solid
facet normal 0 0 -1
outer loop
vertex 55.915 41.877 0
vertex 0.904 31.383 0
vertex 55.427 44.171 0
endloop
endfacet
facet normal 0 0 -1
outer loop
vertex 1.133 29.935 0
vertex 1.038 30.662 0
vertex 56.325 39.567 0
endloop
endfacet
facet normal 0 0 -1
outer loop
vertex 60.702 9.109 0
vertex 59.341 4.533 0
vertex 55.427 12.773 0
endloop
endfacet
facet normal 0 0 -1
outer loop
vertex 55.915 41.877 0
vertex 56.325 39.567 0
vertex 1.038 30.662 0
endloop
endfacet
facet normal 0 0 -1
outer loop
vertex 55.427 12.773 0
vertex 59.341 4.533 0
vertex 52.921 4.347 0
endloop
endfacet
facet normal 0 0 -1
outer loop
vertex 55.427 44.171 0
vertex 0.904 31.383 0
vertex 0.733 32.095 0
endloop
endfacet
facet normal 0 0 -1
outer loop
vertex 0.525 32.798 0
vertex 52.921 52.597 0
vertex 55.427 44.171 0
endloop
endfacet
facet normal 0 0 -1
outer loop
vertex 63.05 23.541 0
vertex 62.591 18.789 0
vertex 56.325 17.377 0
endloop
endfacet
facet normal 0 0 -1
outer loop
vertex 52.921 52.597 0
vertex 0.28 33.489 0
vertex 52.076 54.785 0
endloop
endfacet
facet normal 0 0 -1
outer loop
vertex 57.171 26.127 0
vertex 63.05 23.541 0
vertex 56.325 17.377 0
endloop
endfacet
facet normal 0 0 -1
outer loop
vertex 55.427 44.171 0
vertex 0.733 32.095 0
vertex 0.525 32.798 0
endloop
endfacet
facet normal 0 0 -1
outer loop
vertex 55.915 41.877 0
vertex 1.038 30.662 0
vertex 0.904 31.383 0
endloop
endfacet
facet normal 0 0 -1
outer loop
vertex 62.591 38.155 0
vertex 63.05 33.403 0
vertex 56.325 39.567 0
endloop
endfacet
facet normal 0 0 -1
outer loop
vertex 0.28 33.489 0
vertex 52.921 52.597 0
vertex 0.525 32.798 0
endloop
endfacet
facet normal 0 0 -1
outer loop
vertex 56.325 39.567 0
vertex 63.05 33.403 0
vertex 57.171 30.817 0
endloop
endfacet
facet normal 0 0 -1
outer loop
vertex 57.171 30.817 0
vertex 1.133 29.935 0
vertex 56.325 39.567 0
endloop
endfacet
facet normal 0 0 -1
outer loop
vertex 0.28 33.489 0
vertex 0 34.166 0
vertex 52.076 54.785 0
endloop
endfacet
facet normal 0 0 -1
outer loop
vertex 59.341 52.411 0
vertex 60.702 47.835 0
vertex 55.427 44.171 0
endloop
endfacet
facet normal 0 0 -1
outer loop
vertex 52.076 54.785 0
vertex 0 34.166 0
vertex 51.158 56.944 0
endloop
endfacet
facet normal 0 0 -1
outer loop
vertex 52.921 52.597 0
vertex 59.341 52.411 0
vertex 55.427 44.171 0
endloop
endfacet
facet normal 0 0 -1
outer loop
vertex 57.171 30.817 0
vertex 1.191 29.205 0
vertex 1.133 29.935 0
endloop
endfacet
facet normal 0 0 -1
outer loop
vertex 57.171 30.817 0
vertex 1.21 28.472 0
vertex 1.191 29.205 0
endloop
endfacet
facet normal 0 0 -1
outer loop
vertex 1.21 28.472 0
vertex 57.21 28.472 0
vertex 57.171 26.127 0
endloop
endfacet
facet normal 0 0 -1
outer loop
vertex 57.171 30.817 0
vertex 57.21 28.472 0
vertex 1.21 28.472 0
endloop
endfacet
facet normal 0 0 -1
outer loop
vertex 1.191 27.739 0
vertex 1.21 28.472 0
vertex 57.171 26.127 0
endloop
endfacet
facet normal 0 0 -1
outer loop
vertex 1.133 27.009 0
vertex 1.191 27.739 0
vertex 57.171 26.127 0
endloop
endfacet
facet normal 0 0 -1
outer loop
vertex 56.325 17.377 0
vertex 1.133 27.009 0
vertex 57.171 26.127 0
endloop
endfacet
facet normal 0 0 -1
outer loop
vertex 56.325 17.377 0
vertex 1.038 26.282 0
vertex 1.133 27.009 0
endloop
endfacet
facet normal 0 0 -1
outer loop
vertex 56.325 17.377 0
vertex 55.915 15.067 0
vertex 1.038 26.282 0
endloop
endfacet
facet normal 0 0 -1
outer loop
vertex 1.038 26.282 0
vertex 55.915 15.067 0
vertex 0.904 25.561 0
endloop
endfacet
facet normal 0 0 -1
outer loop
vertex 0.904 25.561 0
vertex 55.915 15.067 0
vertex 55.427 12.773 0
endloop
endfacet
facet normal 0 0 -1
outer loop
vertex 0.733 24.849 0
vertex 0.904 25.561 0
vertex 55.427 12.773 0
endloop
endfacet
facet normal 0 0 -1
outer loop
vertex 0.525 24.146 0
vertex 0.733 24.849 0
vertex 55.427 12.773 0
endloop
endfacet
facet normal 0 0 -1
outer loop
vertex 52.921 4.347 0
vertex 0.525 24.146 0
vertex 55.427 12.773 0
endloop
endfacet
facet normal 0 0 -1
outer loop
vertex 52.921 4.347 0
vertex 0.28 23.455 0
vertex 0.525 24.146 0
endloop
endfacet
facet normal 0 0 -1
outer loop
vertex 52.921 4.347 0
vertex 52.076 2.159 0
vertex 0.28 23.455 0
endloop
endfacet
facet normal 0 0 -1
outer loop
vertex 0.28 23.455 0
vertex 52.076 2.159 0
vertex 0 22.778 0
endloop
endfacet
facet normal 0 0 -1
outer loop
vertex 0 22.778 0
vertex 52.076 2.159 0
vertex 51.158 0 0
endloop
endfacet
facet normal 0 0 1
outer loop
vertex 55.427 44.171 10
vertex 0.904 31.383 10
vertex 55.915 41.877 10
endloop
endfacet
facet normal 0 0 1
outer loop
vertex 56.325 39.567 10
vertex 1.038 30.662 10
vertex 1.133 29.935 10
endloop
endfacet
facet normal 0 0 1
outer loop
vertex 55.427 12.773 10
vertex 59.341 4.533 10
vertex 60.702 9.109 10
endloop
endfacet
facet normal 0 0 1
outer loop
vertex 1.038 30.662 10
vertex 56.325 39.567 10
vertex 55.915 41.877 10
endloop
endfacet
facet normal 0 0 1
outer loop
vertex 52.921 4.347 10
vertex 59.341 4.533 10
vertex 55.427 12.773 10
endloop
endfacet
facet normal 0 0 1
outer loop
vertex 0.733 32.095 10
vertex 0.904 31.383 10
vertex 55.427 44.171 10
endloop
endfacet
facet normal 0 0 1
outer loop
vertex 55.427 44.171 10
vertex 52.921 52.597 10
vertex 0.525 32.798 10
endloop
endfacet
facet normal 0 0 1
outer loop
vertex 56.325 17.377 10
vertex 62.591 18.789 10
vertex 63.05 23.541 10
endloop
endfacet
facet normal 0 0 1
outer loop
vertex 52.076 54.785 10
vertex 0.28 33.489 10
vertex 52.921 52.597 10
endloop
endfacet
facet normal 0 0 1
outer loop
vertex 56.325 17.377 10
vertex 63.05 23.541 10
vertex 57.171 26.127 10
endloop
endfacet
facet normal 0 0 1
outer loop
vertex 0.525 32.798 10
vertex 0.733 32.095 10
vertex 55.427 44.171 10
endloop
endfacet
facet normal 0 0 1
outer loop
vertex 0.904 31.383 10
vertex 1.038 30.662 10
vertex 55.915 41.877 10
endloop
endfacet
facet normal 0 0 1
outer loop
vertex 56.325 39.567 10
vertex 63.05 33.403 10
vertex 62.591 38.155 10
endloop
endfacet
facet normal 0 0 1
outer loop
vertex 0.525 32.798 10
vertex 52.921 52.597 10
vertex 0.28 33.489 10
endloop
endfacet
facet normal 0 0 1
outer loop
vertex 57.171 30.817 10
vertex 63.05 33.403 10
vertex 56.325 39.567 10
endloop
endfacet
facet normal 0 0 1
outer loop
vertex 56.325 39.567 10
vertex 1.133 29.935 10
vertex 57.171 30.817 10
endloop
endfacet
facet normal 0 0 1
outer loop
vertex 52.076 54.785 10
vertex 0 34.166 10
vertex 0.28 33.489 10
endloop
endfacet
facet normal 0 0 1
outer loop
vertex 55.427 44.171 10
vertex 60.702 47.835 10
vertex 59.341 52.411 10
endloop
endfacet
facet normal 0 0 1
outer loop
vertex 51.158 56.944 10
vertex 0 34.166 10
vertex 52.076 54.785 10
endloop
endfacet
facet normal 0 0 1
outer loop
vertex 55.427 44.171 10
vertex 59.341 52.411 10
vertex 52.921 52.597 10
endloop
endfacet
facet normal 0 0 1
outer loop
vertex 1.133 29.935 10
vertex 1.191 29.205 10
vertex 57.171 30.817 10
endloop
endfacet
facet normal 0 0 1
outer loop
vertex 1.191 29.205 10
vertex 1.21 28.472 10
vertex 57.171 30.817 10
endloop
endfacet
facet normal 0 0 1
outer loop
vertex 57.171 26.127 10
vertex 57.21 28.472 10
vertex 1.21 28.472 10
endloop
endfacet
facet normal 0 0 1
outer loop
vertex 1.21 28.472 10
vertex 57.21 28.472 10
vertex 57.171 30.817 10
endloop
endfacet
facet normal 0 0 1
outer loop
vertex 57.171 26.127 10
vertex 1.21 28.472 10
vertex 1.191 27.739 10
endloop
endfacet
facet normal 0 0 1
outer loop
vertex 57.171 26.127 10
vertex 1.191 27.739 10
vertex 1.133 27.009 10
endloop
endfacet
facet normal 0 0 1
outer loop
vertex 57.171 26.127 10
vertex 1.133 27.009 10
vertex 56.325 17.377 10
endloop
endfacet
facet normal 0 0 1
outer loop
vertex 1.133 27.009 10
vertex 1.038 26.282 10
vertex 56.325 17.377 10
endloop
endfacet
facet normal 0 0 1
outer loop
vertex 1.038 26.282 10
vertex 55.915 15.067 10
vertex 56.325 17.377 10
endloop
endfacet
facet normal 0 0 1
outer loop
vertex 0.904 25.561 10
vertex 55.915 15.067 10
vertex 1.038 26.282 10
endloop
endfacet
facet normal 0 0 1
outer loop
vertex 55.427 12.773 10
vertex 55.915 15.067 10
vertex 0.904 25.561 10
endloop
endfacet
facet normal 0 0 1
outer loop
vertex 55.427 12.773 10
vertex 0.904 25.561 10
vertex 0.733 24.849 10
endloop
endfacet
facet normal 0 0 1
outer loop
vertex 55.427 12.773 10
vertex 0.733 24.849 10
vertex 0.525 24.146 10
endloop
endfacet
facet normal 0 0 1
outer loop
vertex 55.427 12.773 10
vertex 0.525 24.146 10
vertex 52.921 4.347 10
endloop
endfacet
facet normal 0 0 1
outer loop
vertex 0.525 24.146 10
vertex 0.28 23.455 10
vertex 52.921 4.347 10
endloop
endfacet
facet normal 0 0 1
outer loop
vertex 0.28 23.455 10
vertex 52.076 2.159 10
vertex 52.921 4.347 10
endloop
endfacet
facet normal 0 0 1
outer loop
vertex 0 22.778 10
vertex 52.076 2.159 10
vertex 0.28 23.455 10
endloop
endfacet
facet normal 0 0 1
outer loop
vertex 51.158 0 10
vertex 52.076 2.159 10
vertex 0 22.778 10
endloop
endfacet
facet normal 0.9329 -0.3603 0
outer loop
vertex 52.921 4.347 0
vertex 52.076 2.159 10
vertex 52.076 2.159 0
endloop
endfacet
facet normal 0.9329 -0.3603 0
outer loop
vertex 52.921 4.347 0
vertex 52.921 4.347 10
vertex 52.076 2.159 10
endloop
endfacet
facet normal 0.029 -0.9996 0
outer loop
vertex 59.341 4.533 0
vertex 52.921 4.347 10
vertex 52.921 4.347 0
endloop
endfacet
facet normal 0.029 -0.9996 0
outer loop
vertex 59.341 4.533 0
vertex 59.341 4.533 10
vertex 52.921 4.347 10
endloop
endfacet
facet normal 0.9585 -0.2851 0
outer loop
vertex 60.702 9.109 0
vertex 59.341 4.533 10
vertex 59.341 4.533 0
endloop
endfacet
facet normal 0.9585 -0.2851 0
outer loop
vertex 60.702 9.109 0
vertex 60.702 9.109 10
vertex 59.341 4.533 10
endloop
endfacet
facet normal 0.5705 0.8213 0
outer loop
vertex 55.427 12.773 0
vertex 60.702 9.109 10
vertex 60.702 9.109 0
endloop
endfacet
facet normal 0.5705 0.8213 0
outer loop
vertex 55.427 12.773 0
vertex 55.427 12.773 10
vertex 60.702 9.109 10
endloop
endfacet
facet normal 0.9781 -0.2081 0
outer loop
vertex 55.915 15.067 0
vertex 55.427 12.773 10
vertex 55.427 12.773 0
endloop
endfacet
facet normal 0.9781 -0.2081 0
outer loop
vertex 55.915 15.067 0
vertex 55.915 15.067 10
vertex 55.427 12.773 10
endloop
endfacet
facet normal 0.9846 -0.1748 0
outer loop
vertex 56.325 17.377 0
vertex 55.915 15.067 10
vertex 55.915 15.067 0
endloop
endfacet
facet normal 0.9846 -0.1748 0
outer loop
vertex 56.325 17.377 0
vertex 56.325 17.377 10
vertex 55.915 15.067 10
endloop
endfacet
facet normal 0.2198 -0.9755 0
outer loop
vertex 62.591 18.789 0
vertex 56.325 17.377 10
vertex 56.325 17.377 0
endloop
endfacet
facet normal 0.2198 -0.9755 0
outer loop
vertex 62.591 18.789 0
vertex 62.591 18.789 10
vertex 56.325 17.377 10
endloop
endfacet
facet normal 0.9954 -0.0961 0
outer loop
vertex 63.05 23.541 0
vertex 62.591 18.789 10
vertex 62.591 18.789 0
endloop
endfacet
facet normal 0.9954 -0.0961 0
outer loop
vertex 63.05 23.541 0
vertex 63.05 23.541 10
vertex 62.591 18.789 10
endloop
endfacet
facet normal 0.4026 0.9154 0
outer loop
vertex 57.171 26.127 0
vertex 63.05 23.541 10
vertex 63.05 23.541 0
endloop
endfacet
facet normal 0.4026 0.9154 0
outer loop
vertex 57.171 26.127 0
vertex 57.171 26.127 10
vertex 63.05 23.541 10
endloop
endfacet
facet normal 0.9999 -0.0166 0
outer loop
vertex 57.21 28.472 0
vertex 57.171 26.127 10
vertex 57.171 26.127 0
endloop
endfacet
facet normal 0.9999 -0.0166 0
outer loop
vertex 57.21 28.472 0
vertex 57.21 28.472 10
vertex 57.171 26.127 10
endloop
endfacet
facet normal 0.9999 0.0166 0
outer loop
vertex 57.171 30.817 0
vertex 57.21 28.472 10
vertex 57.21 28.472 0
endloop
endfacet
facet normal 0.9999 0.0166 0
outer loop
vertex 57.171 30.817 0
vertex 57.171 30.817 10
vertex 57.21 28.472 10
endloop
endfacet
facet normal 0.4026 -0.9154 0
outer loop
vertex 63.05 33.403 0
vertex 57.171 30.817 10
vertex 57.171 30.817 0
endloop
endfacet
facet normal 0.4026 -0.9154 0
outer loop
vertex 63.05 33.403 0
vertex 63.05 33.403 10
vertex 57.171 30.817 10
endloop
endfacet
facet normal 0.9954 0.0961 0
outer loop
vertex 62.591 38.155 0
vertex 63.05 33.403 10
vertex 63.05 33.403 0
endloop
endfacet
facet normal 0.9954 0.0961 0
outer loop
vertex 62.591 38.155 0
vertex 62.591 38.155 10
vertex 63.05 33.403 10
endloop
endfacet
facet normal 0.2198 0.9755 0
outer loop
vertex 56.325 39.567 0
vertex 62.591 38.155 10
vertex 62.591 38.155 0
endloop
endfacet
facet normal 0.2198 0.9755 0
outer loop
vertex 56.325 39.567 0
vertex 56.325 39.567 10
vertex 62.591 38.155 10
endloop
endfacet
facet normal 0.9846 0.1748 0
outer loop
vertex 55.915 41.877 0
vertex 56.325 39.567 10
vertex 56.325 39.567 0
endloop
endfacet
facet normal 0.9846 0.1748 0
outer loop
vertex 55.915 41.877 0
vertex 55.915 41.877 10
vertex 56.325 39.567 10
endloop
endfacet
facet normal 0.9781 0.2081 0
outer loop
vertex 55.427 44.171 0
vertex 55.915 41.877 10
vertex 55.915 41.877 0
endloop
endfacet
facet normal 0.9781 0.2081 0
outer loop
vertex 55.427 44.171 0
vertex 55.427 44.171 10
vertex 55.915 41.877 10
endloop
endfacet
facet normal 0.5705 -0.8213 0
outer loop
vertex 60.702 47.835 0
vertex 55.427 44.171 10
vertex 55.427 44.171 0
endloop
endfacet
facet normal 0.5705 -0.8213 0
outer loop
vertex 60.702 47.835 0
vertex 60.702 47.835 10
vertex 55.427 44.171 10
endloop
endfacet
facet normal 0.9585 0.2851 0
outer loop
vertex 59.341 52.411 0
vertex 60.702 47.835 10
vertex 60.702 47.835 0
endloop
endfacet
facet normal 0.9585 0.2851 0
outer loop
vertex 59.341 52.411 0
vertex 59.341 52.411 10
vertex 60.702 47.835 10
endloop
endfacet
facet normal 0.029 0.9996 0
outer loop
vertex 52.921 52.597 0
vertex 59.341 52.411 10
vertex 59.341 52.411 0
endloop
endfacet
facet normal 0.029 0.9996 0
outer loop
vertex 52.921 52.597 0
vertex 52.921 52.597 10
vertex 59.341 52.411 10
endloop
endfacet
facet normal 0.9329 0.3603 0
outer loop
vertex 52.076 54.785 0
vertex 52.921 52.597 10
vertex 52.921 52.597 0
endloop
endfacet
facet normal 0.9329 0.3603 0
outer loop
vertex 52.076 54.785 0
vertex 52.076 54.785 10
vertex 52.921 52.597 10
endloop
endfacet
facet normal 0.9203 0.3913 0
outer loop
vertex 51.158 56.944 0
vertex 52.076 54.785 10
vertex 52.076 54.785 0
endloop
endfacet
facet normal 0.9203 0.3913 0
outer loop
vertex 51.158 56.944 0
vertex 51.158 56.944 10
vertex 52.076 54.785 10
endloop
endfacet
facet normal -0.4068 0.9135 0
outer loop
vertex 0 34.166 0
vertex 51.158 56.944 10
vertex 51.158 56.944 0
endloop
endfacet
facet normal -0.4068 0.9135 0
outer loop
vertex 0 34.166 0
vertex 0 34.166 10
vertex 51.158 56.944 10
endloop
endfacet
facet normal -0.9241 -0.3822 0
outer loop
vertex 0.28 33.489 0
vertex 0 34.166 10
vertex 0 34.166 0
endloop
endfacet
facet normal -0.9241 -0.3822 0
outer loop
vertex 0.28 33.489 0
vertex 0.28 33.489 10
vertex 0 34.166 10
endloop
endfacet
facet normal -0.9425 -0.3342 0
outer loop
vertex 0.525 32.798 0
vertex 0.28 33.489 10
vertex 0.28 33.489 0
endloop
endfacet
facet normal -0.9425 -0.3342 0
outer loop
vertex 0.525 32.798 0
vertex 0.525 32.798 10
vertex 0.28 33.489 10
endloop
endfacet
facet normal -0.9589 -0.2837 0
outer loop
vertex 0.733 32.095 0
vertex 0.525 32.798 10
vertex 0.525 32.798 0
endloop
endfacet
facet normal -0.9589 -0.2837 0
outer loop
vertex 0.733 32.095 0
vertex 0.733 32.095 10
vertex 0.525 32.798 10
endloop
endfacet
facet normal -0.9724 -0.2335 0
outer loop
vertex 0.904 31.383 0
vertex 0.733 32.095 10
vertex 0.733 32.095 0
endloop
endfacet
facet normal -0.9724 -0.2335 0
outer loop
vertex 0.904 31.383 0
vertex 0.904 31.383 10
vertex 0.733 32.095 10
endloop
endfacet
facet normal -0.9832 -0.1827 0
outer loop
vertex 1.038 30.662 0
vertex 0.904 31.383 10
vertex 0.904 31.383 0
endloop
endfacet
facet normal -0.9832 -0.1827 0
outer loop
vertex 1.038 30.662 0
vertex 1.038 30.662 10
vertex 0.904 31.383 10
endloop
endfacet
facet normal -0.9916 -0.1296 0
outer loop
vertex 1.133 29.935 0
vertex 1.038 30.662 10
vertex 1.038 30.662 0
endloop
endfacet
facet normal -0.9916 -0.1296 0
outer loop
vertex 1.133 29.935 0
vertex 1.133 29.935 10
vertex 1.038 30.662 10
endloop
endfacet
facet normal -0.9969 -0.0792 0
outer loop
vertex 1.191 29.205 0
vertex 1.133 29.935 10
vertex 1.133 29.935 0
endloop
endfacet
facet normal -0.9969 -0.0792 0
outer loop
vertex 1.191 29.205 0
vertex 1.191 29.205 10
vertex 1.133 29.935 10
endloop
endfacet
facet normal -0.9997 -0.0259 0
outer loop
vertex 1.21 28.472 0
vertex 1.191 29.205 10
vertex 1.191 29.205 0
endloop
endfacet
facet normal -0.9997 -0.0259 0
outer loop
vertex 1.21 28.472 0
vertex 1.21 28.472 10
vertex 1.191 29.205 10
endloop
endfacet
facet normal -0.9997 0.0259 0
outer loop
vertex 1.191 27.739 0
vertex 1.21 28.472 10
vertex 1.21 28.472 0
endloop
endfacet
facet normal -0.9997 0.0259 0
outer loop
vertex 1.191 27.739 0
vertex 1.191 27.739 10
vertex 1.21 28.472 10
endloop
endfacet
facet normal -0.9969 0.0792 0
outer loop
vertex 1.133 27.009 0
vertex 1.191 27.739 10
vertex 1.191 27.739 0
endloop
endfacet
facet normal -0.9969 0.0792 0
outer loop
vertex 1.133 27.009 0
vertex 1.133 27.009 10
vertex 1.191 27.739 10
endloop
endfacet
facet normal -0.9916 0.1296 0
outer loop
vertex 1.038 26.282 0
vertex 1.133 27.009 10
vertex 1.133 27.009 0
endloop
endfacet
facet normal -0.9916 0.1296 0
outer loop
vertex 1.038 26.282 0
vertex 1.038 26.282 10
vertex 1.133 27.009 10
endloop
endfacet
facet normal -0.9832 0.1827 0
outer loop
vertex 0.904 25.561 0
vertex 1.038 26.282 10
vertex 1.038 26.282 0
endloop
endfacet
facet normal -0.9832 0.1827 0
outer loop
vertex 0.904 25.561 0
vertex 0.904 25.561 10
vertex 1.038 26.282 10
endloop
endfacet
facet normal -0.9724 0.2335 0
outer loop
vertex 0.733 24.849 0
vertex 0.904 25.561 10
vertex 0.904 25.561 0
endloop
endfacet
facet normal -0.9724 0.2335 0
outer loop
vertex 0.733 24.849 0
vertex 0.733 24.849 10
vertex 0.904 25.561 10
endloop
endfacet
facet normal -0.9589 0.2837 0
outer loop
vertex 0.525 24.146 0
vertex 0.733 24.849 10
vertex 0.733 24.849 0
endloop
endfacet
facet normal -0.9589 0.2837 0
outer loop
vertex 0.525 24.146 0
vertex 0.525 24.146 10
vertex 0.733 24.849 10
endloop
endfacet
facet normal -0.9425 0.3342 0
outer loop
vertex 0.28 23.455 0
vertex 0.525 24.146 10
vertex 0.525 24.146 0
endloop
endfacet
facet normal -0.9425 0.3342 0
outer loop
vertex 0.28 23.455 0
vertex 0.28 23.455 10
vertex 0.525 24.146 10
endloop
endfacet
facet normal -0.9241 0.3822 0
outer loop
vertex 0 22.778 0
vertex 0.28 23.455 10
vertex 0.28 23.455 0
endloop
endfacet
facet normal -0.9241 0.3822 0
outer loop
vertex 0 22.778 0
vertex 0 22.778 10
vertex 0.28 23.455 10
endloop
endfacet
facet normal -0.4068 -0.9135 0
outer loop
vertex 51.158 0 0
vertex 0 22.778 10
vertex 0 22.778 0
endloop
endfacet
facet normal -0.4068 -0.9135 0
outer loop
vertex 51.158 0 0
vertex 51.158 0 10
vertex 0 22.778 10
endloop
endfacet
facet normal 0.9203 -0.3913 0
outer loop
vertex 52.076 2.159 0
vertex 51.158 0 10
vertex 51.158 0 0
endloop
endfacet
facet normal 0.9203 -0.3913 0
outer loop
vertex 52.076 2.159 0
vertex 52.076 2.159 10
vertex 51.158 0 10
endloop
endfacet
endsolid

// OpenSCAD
$fn = 32;

// ----------------------------------------------------------------------
// Gear sector: 4 teeth on 48 degrees
// ----------------------------------------------------------------------

// --- parameters (mm) ---
sector_angle = 48;        // sector angle, degrees
root_r = 70;              // root circle radius
tooth_h = 6;              // tooth height over the root circle
teeth = 4;                // number of teeth on the sector
hub_r = 14;               // hub bore radius
plate_t = 10;             // sector thickness, Z
arc_step = 3;             // sampling step of the root/hub arcs, degrees

tip_r = root_r + tooth_h;  // tip circle radius

profile = [[51.158, 0], [52.076, 2.159], [52.921, 4.347], [59.341, 4.533], [60.702, 9.109], [55.427, 12.773], [55.915, 15.067], [56.325, 17.377], [62.591, 18.789], [63.05, 23.541], [57.171, 26.127], [57.21, 28.472], [57.171, 30.817], [63.05, 33.403], [62.591, 38.155], [56.325, 39.567], [55.915, 41.877], [55.427, 44.171], [60.702, 47.835], [59.341, 52.411], [52.921, 52.597], [52.076, 54.785], [51.158, 56.944], [0, 34.166], [0.28, 33.489], [0.525, 32.798], [0.733, 32.095], [0.904, 31.383], [1.038, 30.662], [1.133, 29.935], [1.191, 29.205], [1.21, 28.472], [1.191, 27.739], [1.133, 27.009], [1.038, 26.282], [0.904, 25.561], [0.733, 24.849], [0.525, 24.146], [0.28, 23.455], [0, 22.778]];  // primary outline, 40 points, counter clockwise

// --- the one profile operation ---
linear_extrude(height = plate_t) polygon(points = profile);
